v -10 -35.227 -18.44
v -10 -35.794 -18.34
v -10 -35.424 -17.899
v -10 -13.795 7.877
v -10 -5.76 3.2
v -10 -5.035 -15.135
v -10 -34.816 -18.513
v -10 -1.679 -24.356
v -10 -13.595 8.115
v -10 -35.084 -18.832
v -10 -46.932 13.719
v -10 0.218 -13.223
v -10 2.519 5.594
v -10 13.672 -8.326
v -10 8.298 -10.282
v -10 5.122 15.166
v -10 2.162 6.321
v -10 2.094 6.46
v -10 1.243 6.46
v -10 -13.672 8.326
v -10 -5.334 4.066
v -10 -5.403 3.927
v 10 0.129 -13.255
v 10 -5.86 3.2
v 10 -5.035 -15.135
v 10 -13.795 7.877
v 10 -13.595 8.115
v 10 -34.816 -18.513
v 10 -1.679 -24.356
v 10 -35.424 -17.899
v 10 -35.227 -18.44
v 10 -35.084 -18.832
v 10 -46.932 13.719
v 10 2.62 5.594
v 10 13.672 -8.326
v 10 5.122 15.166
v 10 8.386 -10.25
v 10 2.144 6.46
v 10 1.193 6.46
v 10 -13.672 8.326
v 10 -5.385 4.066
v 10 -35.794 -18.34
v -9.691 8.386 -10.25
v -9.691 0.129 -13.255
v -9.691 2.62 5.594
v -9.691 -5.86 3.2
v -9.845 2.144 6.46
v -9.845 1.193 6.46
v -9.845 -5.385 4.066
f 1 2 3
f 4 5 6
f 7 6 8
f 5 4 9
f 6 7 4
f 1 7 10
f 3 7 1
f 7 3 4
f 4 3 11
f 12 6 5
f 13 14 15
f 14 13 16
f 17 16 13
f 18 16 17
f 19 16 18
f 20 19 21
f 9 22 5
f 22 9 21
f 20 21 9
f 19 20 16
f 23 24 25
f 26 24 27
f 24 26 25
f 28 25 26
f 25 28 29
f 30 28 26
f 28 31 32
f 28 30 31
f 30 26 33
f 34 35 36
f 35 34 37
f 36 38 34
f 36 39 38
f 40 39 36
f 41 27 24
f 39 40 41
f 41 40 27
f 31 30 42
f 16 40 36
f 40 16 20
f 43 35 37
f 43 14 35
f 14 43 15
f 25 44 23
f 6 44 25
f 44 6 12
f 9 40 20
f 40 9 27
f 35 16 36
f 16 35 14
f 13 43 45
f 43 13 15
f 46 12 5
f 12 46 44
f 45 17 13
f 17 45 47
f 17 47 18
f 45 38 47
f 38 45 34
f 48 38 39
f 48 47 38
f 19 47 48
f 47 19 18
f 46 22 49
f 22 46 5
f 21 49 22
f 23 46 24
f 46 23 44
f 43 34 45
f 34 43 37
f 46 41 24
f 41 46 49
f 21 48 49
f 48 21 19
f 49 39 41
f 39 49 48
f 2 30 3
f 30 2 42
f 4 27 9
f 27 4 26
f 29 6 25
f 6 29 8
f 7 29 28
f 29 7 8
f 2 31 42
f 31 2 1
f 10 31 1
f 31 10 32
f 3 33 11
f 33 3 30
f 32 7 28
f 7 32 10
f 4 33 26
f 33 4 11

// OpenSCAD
module bloop(){
minkowski(){
rotate([20,0,0]){
cube([20,7,20], center=true);
}//end of rotate
	 sphere(r=1,h=1);
}//end of minkowski
}//end of bloop (inside part)

module danger(){
rotate([50,0,0]){
rotate([0,90,0])
cylinder(r1=20, r2=20, h=20, $fn=3);
}//end of rotate
}//end of danger (triangle)


difference(){
rotate([20,0,0])
cube([20,20,25], center=true);//main clip

translate([0,1.8,-5])
bloop();//inside part
}

translate([-10,-17,-11.5])
danger();//not janky triangle

rotate([20,180,0]){
translate([-10,-30,10])
danger();
}//end of rotate (this constructs the rhombus)
